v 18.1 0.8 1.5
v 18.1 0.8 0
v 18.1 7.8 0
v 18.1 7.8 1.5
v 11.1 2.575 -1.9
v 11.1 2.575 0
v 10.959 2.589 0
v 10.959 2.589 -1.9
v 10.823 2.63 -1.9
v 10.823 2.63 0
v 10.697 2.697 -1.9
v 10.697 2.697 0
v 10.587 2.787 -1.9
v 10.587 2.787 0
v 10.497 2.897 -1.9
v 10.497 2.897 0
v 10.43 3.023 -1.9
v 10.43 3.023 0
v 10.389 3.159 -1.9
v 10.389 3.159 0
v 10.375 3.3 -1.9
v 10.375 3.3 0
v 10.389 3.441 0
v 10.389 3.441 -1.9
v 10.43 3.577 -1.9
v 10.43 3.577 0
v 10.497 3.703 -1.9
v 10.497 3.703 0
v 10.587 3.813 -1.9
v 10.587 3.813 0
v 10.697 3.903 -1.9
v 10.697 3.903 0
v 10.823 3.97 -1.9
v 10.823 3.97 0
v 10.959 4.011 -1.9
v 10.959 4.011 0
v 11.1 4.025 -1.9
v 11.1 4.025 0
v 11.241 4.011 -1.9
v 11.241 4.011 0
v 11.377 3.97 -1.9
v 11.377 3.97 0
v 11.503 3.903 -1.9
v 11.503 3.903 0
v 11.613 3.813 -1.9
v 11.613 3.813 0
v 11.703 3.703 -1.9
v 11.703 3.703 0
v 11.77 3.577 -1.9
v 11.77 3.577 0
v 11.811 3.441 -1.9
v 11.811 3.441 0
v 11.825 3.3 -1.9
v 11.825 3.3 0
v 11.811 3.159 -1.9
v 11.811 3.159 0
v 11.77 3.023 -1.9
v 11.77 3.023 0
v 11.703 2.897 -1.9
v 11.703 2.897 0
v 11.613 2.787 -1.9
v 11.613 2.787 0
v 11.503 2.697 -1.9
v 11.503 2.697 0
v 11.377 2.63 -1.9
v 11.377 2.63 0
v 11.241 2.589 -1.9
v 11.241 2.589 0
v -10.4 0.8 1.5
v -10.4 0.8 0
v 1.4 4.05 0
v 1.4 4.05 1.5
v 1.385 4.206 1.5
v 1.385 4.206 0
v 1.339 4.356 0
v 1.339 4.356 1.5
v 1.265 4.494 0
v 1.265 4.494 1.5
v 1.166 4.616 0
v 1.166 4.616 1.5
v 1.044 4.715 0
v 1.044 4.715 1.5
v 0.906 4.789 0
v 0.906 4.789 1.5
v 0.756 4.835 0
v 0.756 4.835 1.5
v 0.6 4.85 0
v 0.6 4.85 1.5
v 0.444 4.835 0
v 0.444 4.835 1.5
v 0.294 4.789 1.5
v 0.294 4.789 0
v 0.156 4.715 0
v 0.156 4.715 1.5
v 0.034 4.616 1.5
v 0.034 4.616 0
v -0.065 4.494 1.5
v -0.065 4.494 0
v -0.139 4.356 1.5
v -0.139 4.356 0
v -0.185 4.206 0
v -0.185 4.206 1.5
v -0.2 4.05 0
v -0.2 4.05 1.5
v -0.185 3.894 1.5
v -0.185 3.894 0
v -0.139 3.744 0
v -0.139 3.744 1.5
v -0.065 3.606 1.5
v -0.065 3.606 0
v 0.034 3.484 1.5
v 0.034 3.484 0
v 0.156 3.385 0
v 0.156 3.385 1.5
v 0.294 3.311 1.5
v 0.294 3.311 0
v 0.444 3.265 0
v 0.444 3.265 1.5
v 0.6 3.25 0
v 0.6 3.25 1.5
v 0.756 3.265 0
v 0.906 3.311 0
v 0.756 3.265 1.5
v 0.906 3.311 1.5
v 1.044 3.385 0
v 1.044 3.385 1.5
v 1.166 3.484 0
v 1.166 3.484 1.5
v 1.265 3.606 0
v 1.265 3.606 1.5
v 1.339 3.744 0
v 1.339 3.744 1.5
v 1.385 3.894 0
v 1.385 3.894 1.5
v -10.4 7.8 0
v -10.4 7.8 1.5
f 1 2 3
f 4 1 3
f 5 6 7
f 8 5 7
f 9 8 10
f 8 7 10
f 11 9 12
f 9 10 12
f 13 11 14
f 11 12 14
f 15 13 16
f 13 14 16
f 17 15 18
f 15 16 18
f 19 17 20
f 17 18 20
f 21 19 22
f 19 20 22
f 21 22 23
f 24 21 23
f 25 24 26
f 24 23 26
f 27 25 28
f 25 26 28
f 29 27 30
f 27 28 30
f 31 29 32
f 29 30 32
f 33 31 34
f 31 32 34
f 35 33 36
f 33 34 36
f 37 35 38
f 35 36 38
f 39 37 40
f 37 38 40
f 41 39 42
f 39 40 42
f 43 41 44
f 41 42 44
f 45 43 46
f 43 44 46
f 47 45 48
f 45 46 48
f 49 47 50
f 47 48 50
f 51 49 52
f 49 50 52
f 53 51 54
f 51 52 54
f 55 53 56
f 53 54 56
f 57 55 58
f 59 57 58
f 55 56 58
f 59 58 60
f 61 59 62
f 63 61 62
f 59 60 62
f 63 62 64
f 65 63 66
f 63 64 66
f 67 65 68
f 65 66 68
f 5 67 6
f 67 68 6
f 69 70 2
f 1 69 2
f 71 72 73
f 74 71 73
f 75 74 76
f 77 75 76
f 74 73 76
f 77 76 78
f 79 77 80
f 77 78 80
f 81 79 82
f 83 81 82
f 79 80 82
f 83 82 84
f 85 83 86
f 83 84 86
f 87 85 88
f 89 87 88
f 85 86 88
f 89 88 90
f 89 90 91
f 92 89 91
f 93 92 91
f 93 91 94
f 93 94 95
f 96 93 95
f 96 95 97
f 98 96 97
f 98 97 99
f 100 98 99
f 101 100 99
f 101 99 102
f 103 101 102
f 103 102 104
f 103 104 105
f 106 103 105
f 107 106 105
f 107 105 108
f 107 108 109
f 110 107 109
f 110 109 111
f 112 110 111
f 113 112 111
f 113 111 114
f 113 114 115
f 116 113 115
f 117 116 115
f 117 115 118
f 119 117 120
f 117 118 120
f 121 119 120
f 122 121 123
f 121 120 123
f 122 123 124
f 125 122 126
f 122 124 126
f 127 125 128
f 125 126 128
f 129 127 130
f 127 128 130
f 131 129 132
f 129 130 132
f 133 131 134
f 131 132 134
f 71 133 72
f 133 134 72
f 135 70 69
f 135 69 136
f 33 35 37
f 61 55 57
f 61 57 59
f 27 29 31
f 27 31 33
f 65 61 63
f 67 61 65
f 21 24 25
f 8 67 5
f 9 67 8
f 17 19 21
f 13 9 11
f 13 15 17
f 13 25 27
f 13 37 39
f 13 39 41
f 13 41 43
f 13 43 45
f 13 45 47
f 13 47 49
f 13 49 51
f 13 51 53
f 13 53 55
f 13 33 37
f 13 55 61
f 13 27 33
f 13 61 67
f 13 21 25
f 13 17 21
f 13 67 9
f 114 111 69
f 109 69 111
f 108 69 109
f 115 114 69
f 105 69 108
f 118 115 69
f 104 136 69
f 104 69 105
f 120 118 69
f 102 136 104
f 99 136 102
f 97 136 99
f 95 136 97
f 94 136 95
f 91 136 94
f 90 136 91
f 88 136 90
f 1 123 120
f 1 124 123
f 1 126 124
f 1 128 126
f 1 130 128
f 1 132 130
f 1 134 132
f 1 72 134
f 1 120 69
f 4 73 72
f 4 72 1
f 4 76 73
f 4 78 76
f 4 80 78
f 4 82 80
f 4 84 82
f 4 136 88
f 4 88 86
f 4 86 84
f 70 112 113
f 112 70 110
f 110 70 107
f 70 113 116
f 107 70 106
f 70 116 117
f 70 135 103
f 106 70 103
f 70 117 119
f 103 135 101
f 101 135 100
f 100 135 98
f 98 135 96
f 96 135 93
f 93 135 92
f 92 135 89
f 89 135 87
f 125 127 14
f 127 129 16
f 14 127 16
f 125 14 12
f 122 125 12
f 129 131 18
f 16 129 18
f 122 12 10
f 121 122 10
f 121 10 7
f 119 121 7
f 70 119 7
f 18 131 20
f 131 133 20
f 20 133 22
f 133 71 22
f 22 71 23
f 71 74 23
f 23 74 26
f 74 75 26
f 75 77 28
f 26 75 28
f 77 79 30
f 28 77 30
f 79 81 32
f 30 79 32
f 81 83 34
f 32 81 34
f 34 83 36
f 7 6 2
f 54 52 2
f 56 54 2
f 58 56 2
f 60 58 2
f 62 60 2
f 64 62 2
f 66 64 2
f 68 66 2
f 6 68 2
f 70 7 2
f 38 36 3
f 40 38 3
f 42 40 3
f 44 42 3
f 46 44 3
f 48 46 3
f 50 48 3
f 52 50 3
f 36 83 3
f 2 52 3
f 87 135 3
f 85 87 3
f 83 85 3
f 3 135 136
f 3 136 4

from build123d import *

# Parameters (mm, degrees)
SKETCH_1_W         = 28.5
SKETCH_1_H         = 7
BASE_DEPTH         = 1.5
SKETCH_4_R         = 0.725
AXIS_DEPTH         = 1.9
HOLE_WIZARD_M2_1_D = 1.6


with BuildPart() as part:
    # 草图1 → base (new body)
    with BuildSketch(Plane.XY):
        with Locations((3.85, 4.3)):
            Rectangle(SKETCH_1_W, SKETCH_1_H)
    extrude(amount=BASE_DEPTH)

    # 草图4 → axis (add)
    with BuildSketch(Plane(origin=(0, 0, 0), x_dir=(-1, 0, 0), z_dir=(0, 0, -1))):
        with Locations(Location((-11.1, 3.3, 0), (0, 0, 270))):
            Circle(SKETCH_4_R)
    extrude(amount=AXIS_DEPTH)

    # M2 螺纹孔的螺纹孔钻头1 (through all)
    with Locations(Plane(origin=(0.6, 4.05, 0), x_dir=(-1, 0, 0), z_dir=(0, 0, -1))):
        with Locations((0, 0)):
            Hole(HOLE_WIZARD_M2_1_D / 2)


solid = part.part
